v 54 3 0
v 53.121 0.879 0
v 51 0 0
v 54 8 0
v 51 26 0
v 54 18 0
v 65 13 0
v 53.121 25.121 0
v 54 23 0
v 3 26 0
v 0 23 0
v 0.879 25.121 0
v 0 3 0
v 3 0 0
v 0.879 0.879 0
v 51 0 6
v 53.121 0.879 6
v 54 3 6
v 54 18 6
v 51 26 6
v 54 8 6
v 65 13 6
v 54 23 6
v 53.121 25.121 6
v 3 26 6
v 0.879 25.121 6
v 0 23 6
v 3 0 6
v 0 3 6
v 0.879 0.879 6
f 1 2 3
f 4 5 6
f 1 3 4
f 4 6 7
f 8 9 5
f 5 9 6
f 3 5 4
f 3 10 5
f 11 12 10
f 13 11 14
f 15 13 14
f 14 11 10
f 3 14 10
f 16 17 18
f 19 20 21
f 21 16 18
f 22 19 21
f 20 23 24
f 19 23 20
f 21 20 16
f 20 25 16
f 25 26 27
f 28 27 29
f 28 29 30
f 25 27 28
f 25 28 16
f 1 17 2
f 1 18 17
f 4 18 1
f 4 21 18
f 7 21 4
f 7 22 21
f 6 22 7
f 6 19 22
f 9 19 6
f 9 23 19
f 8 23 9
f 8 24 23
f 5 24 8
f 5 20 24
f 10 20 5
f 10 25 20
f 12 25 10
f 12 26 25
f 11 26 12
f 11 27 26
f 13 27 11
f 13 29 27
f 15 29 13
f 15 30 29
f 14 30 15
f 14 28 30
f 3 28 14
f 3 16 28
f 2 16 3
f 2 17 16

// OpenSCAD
$fn = 32;

// ----------------------------------------------------------------------
// Ratchet pawl: 54 x 26 mm body, beak 11 mm с правого торца
// ----------------------------------------------------------------------

// --- parameters (mm) ---
profile_height = 6;       // extrusion height
profile_points = 15;      // points of the closed outline

profile = [[0, 3], [0.879, 0.879], [3, 0], [51, 0], [53.121, 0.879], [54, 3], [54, 8], [65, 13], [54, 18], [54, 23], [53.121, 25.121], [51, 26], [3, 26], [0.879, 25.121], [0, 23]];  // single closed polygon, 15 points, counter clockwise

// --- the one profile operation ---
linear_extrude(height = profile_height) polygon(points = profile);
